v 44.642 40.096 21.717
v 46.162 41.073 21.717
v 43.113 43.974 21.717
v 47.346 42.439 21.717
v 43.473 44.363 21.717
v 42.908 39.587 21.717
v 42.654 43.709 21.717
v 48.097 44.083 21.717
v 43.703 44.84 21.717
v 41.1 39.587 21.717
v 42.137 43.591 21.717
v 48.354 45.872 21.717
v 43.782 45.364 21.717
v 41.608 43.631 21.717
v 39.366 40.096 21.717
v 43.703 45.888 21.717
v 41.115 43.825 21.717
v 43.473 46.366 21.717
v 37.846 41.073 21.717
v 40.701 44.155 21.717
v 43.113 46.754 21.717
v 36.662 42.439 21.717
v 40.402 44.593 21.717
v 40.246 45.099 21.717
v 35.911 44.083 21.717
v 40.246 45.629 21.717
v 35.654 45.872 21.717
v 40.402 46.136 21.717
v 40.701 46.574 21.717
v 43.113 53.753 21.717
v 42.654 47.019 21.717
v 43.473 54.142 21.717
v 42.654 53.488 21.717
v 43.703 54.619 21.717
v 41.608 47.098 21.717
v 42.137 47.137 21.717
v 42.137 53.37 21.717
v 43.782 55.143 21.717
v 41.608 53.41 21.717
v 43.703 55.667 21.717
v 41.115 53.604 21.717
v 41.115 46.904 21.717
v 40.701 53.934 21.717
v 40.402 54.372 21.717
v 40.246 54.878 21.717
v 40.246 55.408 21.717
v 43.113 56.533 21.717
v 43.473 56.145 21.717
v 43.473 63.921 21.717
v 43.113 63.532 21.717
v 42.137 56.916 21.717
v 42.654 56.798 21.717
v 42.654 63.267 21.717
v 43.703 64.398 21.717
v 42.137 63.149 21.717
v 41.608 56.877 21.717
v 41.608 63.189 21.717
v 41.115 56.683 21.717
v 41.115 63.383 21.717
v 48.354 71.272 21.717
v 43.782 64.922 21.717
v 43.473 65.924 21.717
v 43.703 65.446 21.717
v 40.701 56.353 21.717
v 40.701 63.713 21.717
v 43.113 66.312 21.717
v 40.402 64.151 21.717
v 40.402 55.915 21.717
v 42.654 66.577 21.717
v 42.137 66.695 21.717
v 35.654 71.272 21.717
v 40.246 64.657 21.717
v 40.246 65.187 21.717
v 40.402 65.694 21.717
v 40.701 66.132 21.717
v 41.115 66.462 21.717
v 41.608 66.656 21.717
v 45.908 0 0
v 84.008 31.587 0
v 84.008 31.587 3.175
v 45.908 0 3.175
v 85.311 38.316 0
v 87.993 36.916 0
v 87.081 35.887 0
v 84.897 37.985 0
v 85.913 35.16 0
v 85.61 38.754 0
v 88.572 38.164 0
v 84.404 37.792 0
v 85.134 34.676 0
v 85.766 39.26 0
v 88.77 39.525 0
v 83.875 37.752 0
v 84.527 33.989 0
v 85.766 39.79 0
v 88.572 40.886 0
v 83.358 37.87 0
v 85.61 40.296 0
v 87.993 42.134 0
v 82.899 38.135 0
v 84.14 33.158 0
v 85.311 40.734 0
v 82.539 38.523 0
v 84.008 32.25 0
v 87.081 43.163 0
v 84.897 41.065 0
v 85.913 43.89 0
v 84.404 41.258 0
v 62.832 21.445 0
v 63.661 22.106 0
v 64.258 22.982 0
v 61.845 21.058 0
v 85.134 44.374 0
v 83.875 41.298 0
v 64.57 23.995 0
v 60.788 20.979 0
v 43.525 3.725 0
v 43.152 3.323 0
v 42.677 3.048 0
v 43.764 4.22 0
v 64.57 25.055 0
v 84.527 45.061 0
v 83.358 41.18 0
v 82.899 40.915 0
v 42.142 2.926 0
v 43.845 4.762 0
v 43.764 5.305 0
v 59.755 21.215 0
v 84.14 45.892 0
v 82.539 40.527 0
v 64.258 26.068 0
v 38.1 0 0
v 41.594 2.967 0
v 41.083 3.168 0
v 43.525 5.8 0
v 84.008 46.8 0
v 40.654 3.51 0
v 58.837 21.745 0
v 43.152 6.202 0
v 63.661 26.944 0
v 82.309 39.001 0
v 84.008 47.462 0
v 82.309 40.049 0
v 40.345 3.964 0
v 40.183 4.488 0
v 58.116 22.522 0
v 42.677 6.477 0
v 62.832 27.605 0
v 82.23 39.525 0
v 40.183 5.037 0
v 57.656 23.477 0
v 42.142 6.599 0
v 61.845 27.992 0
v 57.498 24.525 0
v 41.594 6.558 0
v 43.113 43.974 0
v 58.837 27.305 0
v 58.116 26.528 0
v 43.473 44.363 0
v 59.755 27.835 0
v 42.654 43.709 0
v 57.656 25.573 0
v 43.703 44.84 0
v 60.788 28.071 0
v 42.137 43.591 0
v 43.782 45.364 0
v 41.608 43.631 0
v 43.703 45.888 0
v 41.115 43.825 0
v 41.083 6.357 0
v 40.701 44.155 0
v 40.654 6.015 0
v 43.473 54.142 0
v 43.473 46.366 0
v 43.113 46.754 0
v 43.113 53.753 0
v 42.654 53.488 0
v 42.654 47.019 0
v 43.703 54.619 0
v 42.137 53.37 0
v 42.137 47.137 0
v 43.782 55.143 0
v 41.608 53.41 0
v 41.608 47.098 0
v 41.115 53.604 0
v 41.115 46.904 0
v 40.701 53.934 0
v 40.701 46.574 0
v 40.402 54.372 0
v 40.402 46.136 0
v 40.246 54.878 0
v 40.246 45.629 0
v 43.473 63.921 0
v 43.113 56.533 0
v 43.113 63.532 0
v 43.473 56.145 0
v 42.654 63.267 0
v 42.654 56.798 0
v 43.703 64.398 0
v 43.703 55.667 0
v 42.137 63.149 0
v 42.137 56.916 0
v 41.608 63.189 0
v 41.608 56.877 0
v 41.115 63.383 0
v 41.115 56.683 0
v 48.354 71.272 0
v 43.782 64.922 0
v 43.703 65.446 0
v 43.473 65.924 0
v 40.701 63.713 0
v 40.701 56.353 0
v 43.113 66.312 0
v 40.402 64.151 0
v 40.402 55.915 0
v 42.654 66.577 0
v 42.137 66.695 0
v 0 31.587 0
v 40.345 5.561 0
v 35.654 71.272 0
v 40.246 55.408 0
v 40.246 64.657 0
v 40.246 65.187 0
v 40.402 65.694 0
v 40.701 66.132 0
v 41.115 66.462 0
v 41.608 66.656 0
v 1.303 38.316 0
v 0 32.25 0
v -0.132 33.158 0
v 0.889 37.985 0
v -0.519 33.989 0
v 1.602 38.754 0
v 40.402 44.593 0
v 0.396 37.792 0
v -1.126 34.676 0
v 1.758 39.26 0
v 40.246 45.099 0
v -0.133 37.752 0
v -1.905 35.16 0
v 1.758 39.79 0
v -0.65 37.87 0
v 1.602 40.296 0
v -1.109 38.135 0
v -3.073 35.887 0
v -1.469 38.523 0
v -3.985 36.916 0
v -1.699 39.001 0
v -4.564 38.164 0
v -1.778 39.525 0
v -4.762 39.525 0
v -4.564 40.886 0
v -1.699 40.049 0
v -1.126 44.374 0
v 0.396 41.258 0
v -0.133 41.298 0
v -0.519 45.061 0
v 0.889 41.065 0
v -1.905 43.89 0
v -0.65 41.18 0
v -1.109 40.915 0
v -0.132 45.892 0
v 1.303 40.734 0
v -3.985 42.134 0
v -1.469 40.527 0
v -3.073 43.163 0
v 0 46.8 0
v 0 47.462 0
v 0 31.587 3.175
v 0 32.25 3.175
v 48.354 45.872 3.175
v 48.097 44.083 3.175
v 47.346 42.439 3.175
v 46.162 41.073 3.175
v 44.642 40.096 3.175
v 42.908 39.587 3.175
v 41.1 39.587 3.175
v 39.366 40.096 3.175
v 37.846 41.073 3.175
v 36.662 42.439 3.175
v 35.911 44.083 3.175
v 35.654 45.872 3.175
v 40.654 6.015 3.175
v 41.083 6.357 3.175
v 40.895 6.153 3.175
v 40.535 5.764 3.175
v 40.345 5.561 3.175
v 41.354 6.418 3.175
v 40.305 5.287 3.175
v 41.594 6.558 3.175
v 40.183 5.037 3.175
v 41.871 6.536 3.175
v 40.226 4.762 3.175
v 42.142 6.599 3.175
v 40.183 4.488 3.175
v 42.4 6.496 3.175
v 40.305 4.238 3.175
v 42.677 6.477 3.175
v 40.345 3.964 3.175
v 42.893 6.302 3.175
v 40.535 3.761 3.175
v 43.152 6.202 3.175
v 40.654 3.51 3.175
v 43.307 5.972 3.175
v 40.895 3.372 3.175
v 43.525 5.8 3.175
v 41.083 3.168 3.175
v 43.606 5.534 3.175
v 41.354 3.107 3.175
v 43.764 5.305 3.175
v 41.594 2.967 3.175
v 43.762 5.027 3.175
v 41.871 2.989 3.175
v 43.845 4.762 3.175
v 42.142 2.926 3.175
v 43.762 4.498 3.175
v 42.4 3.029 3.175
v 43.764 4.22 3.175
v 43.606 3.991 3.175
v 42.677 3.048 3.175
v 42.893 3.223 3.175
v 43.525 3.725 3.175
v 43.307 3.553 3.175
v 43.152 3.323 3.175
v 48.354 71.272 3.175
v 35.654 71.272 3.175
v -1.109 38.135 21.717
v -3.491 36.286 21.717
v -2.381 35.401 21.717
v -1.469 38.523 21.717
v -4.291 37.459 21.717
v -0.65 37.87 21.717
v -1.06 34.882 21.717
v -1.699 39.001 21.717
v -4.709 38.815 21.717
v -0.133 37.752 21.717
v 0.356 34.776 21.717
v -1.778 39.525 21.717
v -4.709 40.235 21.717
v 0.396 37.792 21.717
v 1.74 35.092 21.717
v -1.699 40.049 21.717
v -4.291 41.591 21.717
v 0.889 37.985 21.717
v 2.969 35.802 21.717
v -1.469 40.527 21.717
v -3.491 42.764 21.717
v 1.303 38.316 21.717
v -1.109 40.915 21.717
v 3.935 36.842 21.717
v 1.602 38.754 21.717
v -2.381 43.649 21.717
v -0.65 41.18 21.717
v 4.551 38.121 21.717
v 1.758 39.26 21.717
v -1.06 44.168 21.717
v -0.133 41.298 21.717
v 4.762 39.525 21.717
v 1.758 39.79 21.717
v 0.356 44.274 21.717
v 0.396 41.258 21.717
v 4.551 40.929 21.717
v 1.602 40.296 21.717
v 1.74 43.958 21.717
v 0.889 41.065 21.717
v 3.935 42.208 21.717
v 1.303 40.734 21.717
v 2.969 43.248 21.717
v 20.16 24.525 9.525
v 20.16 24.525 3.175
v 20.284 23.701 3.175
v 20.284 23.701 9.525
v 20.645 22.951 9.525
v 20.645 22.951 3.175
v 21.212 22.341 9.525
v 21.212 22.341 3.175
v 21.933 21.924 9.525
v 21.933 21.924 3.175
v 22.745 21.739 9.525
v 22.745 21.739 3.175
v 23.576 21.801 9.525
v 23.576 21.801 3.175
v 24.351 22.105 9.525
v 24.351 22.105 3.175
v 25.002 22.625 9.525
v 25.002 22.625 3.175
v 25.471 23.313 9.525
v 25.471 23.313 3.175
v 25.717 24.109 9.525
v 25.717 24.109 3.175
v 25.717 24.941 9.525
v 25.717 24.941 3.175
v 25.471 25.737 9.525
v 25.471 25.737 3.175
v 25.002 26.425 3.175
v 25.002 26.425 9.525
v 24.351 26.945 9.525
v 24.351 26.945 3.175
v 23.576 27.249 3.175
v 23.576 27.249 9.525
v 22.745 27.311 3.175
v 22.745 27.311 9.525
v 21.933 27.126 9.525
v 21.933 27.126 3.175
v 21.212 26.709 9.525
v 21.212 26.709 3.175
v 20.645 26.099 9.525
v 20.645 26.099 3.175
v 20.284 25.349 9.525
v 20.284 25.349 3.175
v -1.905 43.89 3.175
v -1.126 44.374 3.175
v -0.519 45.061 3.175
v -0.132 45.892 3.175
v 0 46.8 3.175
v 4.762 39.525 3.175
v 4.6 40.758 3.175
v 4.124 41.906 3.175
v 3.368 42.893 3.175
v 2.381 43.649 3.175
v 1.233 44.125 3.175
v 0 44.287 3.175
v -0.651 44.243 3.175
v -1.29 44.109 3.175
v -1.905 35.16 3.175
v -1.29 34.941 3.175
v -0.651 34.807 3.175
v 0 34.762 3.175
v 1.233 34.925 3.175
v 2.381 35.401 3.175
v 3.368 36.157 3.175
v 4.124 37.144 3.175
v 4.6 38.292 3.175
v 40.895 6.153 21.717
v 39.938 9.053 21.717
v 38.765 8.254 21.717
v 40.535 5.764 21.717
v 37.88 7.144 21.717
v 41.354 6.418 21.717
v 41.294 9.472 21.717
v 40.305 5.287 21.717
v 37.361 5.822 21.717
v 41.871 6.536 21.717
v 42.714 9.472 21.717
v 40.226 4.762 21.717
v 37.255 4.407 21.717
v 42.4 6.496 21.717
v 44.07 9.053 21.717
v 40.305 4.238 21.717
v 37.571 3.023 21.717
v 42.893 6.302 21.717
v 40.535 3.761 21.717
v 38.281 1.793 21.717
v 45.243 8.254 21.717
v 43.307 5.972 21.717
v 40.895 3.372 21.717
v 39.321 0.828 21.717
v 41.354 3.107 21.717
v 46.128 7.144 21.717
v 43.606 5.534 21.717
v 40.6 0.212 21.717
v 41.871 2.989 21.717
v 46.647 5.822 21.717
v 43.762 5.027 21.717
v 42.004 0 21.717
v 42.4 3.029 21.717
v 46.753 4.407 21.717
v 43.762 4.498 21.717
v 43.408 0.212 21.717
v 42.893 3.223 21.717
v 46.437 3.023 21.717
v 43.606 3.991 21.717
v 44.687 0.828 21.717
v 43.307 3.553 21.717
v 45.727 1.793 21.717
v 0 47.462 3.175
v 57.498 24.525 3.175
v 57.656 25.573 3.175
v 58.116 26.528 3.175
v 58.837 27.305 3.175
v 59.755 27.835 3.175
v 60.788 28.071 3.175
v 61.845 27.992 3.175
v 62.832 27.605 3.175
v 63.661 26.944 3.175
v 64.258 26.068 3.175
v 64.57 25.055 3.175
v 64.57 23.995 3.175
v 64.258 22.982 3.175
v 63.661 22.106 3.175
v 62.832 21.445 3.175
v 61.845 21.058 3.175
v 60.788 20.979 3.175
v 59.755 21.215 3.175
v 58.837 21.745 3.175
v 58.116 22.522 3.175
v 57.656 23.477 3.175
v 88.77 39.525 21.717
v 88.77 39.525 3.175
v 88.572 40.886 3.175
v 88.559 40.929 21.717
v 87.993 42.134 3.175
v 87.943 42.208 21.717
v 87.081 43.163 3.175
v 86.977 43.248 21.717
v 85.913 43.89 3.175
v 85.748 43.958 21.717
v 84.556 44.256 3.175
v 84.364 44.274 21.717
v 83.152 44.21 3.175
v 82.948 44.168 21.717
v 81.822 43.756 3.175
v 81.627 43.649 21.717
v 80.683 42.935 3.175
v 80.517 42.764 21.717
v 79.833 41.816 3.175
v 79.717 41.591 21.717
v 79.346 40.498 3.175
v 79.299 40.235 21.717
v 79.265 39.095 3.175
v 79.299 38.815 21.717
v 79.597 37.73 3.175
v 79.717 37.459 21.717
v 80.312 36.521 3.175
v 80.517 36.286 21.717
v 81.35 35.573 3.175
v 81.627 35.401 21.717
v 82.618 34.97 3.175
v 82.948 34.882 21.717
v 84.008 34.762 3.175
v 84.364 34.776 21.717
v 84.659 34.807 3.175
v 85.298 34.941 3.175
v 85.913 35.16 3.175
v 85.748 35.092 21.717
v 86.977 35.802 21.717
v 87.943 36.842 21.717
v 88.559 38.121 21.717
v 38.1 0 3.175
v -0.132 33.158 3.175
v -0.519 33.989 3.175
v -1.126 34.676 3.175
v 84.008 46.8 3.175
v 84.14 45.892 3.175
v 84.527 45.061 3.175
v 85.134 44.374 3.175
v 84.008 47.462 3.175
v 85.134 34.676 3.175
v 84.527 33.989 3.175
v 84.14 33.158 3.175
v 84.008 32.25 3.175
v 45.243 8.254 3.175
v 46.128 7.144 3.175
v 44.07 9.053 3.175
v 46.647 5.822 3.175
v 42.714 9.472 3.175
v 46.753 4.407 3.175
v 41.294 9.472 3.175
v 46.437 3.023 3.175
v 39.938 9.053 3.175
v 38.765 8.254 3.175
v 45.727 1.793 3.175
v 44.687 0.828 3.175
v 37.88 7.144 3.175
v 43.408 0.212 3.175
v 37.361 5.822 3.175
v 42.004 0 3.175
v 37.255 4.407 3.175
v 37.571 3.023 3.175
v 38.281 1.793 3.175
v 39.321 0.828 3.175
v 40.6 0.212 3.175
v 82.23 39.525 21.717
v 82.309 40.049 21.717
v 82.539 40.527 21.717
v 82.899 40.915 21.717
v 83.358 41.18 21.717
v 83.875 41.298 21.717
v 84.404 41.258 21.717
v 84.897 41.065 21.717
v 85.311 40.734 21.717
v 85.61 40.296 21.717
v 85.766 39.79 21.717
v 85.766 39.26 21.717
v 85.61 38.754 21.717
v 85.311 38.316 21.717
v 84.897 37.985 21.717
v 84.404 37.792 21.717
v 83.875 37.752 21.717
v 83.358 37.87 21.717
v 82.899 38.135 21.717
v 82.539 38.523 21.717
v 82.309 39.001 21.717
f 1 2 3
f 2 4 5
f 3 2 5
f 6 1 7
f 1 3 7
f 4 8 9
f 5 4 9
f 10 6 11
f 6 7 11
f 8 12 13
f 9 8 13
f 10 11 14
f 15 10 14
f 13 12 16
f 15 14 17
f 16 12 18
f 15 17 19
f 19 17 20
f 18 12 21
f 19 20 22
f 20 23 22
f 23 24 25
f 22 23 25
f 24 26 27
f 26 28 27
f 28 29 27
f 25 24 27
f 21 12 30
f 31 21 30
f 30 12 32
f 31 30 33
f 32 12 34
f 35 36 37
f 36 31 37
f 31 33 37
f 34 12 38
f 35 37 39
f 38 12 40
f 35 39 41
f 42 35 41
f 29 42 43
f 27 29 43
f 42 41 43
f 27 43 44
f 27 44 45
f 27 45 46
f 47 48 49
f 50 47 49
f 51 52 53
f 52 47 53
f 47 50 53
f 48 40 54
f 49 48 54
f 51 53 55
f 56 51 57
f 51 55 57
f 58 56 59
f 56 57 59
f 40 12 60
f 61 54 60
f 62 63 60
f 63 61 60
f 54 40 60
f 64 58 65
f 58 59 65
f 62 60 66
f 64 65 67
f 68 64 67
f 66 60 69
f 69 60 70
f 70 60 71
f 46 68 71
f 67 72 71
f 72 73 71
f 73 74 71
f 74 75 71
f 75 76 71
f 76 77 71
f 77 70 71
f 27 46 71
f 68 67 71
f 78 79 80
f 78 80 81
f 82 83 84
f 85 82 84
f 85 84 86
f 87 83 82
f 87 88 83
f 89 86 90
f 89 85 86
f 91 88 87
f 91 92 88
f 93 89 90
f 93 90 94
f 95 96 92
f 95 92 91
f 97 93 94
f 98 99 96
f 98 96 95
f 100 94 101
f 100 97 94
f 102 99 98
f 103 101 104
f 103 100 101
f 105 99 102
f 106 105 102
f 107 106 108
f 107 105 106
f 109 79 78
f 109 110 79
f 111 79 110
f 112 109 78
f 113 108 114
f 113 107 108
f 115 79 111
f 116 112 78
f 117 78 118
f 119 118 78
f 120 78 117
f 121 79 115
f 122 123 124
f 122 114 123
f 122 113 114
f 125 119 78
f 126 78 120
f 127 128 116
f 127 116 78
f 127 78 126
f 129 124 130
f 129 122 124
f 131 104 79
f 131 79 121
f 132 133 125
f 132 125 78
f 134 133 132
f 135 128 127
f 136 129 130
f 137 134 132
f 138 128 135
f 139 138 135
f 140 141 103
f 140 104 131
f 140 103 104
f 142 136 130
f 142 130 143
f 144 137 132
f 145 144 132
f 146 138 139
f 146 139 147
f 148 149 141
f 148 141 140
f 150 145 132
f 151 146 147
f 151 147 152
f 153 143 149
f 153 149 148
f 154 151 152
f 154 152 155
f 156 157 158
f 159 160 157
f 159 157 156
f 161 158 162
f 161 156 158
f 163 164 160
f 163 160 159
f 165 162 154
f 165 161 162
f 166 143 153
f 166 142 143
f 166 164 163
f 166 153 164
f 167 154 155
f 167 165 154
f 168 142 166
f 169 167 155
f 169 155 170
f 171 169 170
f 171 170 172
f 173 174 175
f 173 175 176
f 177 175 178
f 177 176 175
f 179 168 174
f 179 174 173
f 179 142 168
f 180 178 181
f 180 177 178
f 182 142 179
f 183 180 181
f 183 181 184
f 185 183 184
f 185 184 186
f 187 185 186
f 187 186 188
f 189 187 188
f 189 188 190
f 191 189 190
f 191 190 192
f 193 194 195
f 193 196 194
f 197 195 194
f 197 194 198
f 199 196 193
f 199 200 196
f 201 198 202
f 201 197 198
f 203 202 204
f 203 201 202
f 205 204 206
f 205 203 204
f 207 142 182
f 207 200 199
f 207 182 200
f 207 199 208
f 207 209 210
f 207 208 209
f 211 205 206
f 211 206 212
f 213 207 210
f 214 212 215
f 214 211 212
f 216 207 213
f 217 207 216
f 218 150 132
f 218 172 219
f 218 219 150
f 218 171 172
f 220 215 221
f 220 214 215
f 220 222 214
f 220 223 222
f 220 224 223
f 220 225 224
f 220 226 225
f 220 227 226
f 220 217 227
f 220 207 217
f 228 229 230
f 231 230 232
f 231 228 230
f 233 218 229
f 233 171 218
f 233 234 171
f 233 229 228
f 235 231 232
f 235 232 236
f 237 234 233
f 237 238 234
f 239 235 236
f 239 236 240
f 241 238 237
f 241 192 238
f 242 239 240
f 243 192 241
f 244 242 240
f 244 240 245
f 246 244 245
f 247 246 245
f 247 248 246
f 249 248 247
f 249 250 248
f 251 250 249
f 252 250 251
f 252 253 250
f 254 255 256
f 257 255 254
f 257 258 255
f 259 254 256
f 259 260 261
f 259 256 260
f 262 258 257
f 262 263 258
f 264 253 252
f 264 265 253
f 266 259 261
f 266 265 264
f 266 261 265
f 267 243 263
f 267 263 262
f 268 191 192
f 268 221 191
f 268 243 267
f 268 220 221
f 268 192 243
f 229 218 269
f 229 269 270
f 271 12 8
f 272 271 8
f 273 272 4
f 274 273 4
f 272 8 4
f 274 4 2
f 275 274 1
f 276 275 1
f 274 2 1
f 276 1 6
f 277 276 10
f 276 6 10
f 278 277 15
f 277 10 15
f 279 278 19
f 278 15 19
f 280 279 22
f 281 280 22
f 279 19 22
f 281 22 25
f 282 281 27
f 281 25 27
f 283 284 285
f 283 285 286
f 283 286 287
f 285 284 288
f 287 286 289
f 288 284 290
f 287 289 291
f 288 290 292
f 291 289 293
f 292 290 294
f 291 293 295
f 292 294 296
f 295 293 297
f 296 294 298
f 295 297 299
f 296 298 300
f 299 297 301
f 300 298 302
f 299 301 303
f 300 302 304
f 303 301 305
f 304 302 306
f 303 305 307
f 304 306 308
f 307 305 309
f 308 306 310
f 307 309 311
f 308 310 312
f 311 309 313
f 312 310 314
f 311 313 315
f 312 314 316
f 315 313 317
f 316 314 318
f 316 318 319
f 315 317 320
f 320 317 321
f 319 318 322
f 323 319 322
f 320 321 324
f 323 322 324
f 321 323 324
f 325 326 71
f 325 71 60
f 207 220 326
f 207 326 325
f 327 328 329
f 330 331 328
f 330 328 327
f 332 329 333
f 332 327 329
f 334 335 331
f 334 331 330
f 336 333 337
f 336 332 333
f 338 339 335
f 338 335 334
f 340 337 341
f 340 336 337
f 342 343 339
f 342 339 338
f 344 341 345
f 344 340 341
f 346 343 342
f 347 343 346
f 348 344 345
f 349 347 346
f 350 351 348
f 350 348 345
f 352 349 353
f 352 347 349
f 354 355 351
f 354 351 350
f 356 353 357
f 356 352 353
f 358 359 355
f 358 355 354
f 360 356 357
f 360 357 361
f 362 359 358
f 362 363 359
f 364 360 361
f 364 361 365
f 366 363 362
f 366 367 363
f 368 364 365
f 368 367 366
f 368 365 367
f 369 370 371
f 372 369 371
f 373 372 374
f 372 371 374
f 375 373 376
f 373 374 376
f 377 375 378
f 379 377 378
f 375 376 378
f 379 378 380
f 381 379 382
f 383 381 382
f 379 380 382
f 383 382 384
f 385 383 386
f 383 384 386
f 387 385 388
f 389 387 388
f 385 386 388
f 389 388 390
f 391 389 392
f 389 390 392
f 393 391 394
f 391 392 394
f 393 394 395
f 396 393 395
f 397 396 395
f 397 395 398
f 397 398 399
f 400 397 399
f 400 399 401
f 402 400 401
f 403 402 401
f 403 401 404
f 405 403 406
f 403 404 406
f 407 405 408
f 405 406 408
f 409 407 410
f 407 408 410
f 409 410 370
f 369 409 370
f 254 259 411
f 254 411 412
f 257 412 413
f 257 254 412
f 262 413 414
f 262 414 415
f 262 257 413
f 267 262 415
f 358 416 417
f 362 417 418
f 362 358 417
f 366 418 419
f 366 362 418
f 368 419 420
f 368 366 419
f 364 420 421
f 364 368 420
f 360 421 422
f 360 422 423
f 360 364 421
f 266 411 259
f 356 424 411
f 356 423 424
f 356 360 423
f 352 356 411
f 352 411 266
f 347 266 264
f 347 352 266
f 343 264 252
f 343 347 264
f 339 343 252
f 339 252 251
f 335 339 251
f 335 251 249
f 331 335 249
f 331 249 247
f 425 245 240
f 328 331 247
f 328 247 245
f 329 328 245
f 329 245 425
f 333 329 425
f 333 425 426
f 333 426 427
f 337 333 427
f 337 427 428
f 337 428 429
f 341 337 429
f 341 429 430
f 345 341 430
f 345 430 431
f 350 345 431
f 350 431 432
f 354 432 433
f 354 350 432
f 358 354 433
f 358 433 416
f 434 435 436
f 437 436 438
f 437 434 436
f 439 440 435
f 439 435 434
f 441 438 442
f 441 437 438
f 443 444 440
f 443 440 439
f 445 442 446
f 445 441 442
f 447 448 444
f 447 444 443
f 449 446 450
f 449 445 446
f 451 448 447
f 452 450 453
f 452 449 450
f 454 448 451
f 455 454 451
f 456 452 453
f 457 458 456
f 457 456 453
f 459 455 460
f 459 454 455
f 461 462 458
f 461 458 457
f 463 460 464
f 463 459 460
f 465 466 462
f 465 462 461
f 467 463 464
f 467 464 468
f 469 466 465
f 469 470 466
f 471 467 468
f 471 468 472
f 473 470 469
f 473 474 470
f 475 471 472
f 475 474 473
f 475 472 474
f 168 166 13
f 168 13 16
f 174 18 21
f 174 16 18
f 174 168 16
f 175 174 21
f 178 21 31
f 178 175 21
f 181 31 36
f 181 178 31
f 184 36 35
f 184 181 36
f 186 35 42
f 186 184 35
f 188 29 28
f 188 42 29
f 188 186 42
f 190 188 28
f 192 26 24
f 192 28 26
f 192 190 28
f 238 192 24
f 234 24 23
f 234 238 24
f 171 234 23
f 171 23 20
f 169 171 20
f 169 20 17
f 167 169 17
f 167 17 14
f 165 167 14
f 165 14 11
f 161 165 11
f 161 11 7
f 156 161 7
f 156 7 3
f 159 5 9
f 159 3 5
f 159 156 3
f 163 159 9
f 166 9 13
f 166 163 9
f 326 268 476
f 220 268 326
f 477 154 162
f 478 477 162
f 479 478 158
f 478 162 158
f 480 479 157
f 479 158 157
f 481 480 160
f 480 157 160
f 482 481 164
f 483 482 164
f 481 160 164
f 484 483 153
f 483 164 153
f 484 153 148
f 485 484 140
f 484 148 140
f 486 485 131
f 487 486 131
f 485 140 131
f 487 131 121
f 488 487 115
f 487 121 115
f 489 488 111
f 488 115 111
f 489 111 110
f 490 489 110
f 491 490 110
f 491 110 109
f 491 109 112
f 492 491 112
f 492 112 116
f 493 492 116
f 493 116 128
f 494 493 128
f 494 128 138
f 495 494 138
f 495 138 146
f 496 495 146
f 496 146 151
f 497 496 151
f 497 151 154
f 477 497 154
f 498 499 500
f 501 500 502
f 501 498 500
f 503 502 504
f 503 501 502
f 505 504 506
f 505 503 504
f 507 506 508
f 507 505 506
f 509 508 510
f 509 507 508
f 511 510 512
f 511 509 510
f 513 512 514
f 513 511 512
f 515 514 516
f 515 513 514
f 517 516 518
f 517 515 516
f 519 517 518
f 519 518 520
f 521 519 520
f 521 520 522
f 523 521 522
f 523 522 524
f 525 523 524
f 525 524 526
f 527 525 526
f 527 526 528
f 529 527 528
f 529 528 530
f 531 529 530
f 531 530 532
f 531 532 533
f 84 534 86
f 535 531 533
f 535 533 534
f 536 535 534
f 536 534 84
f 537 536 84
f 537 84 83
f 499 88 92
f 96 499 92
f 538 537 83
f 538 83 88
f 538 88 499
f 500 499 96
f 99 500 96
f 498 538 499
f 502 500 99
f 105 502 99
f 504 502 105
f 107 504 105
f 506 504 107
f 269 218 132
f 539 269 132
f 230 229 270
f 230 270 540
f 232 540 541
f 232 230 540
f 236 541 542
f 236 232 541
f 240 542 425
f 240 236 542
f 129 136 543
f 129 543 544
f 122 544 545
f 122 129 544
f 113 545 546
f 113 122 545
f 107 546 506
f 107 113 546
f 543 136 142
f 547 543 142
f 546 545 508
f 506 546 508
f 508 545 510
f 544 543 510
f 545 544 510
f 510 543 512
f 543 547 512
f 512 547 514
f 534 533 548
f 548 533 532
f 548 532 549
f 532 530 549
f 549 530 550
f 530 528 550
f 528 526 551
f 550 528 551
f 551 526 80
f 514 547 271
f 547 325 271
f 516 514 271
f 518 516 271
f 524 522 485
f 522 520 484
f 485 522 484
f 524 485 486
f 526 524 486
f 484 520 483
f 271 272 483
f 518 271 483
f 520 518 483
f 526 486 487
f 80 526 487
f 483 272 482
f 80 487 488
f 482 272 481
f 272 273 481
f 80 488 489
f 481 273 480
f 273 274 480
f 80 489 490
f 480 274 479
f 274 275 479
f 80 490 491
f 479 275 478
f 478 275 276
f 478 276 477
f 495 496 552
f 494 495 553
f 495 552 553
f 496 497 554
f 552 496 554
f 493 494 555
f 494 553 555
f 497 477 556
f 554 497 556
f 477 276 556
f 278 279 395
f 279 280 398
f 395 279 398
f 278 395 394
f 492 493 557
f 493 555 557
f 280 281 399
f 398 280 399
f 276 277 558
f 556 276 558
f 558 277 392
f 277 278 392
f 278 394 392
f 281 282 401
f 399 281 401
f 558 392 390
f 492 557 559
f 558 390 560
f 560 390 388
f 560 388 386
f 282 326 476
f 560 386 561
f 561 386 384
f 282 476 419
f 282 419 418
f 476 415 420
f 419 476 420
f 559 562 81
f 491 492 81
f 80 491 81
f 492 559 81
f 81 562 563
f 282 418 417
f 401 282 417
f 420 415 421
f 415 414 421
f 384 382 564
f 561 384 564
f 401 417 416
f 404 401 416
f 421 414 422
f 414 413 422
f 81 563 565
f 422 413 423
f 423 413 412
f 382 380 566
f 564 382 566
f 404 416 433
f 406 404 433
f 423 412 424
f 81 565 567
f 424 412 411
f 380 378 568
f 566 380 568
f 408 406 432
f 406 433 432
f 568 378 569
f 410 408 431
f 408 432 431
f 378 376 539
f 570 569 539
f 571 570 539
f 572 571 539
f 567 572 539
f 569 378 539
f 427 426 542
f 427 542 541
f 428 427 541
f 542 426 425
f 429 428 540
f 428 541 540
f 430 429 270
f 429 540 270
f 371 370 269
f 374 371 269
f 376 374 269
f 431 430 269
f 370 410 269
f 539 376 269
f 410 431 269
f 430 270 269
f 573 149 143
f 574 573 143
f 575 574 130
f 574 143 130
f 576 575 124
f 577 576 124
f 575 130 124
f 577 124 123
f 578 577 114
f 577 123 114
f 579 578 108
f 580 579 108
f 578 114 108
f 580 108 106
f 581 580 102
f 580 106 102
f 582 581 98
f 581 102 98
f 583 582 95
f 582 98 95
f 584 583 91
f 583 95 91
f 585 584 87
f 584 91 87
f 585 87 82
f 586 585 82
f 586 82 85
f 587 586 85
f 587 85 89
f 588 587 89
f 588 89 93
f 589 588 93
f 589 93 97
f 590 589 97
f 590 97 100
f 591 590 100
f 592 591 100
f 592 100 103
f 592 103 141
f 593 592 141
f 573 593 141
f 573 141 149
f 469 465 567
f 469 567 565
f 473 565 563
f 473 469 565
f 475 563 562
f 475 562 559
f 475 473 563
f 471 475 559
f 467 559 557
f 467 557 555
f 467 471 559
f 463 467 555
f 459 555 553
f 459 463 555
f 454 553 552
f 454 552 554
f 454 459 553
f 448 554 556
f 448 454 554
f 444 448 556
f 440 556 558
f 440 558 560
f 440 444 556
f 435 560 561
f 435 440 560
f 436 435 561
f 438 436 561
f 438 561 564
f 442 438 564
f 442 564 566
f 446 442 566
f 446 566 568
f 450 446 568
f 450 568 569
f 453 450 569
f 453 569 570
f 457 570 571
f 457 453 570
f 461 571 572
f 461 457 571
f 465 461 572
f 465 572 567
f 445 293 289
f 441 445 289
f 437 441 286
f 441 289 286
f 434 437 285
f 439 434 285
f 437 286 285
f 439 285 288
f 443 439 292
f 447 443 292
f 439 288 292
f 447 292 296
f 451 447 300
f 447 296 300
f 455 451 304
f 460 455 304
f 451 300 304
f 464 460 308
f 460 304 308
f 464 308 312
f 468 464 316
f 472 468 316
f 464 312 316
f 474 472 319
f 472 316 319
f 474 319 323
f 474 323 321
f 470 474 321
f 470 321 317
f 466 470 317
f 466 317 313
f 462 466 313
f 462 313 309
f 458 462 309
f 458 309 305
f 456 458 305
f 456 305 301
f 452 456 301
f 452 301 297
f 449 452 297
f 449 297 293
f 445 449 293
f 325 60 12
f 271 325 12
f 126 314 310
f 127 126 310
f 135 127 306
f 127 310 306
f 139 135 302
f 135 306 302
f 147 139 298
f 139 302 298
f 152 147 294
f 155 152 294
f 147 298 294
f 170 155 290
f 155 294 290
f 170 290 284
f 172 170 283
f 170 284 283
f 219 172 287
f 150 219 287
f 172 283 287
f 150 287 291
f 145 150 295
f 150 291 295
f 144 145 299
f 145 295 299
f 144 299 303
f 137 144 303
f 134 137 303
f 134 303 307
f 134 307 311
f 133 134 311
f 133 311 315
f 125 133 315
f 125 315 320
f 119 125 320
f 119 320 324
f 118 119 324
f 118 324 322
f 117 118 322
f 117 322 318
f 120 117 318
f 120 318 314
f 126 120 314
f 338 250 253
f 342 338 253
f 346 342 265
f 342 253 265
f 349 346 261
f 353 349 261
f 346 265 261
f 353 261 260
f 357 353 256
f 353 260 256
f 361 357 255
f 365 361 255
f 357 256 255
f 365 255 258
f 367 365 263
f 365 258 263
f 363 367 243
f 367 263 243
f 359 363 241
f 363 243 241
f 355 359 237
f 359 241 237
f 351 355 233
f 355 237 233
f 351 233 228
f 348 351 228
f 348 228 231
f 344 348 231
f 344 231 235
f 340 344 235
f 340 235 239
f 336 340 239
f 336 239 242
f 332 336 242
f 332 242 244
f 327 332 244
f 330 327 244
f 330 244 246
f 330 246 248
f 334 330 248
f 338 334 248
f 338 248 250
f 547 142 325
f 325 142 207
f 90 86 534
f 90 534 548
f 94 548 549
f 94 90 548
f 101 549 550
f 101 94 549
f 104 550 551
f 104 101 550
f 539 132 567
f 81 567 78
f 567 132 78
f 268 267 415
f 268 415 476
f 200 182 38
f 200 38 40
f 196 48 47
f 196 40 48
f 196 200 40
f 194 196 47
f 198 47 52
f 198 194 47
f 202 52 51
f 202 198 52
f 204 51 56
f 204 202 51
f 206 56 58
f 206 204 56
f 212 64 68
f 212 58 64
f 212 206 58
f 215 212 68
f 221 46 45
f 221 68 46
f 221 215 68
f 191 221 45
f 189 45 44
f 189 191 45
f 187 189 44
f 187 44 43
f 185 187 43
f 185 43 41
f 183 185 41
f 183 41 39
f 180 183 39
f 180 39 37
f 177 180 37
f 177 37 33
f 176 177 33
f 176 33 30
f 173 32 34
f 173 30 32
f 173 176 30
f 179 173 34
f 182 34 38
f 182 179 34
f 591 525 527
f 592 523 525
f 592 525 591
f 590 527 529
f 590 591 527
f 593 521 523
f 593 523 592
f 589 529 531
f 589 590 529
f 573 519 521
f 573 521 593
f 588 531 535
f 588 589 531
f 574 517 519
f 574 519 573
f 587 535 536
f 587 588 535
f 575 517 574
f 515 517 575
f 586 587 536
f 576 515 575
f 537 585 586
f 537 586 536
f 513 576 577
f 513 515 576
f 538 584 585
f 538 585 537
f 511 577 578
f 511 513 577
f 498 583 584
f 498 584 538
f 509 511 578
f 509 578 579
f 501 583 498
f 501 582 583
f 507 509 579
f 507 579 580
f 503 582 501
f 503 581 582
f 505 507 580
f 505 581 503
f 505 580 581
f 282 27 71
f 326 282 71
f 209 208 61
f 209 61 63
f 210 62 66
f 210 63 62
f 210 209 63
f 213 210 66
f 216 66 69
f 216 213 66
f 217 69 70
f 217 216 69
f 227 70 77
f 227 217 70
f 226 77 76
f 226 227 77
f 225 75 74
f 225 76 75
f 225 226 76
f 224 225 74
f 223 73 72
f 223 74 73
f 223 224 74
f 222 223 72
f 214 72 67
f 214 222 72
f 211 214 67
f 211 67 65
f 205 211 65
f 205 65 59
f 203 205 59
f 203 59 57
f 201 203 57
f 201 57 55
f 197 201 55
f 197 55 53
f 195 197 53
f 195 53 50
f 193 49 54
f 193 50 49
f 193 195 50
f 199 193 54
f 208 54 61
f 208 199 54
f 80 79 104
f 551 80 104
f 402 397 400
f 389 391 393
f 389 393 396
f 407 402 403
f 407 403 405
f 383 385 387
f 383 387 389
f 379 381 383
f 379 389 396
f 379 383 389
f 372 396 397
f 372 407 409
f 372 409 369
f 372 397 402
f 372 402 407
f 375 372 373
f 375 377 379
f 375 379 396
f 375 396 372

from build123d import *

# Parameters (mm, degrees)
SKETCH1_W               = 84.00796
SKETCH1_H               = 71.2724
BOSS_EXTRUDE1_DEPTH     = 3.175
SKETCH5_R               = 4.7625
BOSS_EXTRUDE3_DEPTH     = 3.175
SKETCH3_R               = 1.8415
CUT_EXTRUDE1_DEPTH      = 114.886040389
BOSS_EXTRUDE4_START     = 18.542
SKETCH6_R               = 4.7625
BOSS_EXTRUDE4_DEPTH     = 18.542
CUT_EXTRUDE2_DEPTH      = 116.341906237
CUT_EXTRUDE2_DEPTH_BACK = 116.341906237
SKETCH4_R               = 1.778
SKETCH7_R               = 1.778
CUT_EXTRUDE3_DEPTH      = 116.894683482
SKETCH8_R               = 3.556
SKETCH8_R_2             = 1.905
CUT_EXTRUDE4_DEPTH      = 116.894683482
CUT_EXTRUDE5_DEPTH      = 116.894683482
FILLET1_R               = 3.175
SKETCH10_R              = 2.794
BOSS_EXTRUDE5_DEPTH     = 6.35
BOSS_EXTRUDE6_START     = 3.175
SKETCH11_R              = 1.905
BOSS_EXTRUDE6_DEPTH     = 3.175


with BuildPart() as part:
    # Sketch1 → Boss-Extrude1 (new body)
    with BuildSketch(Plane.XY):
        with Locations((42.00398, 35.6362)):
            Rectangle(SKETCH1_W, SKETCH1_H)
    extrude(amount=BOSS_EXTRUDE1_DEPTH)

    # Sketch5 → Boss-Extrude3 (add)
    with BuildSketch(Plane.XY.offset(3.175)):
        with Locations((84.00796, 39.524999944)):
            Circle(SKETCH5_R)
        with Locations((0, 39.524999944)):
            Circle(SKETCH5_R)
    extrude(amount=-BOSS_EXTRUDE3_DEPTH)

    # Sketch3 → Cut-Extrude1 (cut, through all)
    with BuildSketch(Plane.XY.offset(3.175)):
        with Locations((42.00398, 4.7625)):
            Circle(SKETCH3_R)
    extrude(amount=-CUT_EXTRUDE1_DEPTH, mode=Mode.SUBTRACT)

    # Sketch6 → Boss-Extrude4 (add)
    with BuildSketch(Plane.XY.offset(3.175).offset(BOSS_EXTRUDE4_START)):
        with Locations((84.00796, 39.524999944)):
            Circle(SKETCH6_R)
        with Locations((0, 39.524999944)):
            Circle(SKETCH6_R)
        with Locations(Location((42.00398, 4.7625, 0), (0, 0, 270))):
            Circle(SKETCH6_R)
        with BuildLine():
            Line((35.65398, 71.2724), (48.35398, 71.2724))
            Line((48.35398, 71.2724), (48.35398, 45.8724))
            ThreePointArc((48.35398, 45.8724), (42.00398, 39.5224), (35.65398, 45.8724))
            Line((35.65398, 45.8724), (35.65398, 71.2724))
        make_face()
    extrude(amount=-BOSS_EXTRUDE4_DEPTH)

    # Sketch4 → Cut-Extrude2 (cut, two sides: drawn at the far end of the back side and taken through both)
    with BuildSketch(Plane.XY.offset(3.175).offset(-CUT_EXTRUDE2_DEPTH_BACK)):
        with Locations((42.00398, 64.9224)):
            Circle(SKETCH4_R)
        with Locations((42.00398, 55.1434)):
            Circle(SKETCH4_R)
        with Locations((42.00398, 45.3644)):
            Circle(SKETCH4_R)
    extrude(amount=CUT_EXTRUDE2_DEPTH + CUT_EXTRUDE2_DEPTH_BACK, mode=Mode.SUBTRACT)

    # Sketch7 → Cut-Extrude3 (cut, through all)
    with BuildSketch(Plane(origin=(0, 0, 0), x_dir=(-1, 0, 0), z_dir=(0, 0, -1))):
        with Locations((-42.00398, 4.7625)):
            Circle(SKETCH7_R)
        with Locations((0, 39.524999944)):
            Circle(SKETCH7_R)
        with Locations((-84.00796, 39.524999944)):
            Circle(SKETCH7_R)
    extrude(amount=-CUT_EXTRUDE3_DEPTH, mode=Mode.SUBTRACT)

    # Sketch8 → Cut-Extrude4 (cut, through all)
    with BuildSketch(Plane(origin=(0, 0, 0), x_dir=(-1, 0, 0), z_dir=(0, 0, -1))):
        with Locations((-61.05398, 24.524999972)):
            Circle(SKETCH8_R)
        with Locations((-22.95398, 24.524999972)):
            Circle(SKETCH8_R_2)
    extrude(amount=-CUT_EXTRUDE4_DEPTH, mode=Mode.SUBTRACT)

    # Sketch9 → Cut-Extrude5 (cut, through all)
    with BuildSketch(Plane(origin=(0, 0, 0), x_dir=(-1, 0, 0), z_dir=(0, 0, -1))):
        Polygon((-84.00796, 0), (-84.00796, 31.587499944), (-45.90796, 0), align=None)
        Polygon((-84.00796, 71.2724), (-84.00796, 47.462499944), (-48.35398, 71.2724), align=None)
    cut_extrude5 = extrude(amount=-CUT_EXTRUDE5_DEPTH, mode=Mode.SUBTRACT)

    # Mirror1: Cut-Extrude5 across plane
    add(cut_extrude5.mirror(Plane(origin=(42.00398, 0, 0), x_dir=(0, 0, 1), z_dir=(1, 0, 0))), mode=Mode.SUBTRACT)

    # Fillet1
    # the kernel refuses this fillet: 3.175 mm, written as the material it adds along each edge
    with BuildSketch(Plane(origin=(84.00796, 34.762499944, 0), x_dir=(0.9789063129307042, 0.2043096436892158, 0), z_dir=(0, 0, 1))) as fillet1_piece_1:
        with BuildLine():
            CenterArc((2.594732475, -3.108027544), FILLET1_R, 101.789089239, 66.421821522)
            Line((-0.513295069, -2.459344425), (0, 0))
            ThreePointArc((0, 0), (0.973024678, -0.100458685), (1.946049356, 0))
        make_face()
    extrude(amount=3.175)
    with BuildSketch(Plane(origin=(84.00796, 44.287499944, 0), x_dir=(0, 1, 0), z_dir=(0, 0, 1)), Plane(origin=(0, 34.762499944, 0), x_dir=(0, -1, 0), z_dir=(0, 0, 1))) as fillet1_piece_2:
        with BuildLine():
            CenterArc((2.512338916, -3.175), FILLET1_R, 90, 66.421821522)
            ThreePointArc((-0.397596651, -1.905), (-0.100458685, -0.973024678), (0, 0))
            Line((0, 0), (2.512338916, 0))
        make_face()
    extrude(amount=3.175)
    with BuildSketch(Plane(origin=(0, 44.287499944, 0), x_dir=(0, 1, 0), z_dir=(0, 0, 1))) as fillet1_piece_3:
        with BuildLine():
            CenterArc((2.512338916, 3.175), FILLET1_R, 203.578178478, 66.421821522)
            ThreePointArc((-0.397596651, 1.905), (-0.100458685, 0.973024678), (0, 0))
            Line((0, 0), (2.512338916, 0))
        make_face()
    extrude(amount=3.175)

    # Sketch10 → Boss-Extrude5 (add)
    with BuildSketch(Plane.XY.offset(3.175)):
        with Locations(Location((22.95398, 24.524999972, 0), (0, 0, 180))):
            Circle(SKETCH10_R)
    extrude(amount=BOSS_EXTRUDE5_DEPTH)

    # Sketch11 → Boss-Extrude6 (add)
    with BuildSketch(Plane(origin=(0, 0, 3.175), x_dir=(-1, 0, 0), z_dir=(0, 0, -1)).offset(BOSS_EXTRUDE6_START)):
        with Locations((-22.95398, 24.524999972)):
            Circle(SKETCH11_R)
    extrude(amount=-BOSS_EXTRUDE6_DEPTH)


solid = part.part
